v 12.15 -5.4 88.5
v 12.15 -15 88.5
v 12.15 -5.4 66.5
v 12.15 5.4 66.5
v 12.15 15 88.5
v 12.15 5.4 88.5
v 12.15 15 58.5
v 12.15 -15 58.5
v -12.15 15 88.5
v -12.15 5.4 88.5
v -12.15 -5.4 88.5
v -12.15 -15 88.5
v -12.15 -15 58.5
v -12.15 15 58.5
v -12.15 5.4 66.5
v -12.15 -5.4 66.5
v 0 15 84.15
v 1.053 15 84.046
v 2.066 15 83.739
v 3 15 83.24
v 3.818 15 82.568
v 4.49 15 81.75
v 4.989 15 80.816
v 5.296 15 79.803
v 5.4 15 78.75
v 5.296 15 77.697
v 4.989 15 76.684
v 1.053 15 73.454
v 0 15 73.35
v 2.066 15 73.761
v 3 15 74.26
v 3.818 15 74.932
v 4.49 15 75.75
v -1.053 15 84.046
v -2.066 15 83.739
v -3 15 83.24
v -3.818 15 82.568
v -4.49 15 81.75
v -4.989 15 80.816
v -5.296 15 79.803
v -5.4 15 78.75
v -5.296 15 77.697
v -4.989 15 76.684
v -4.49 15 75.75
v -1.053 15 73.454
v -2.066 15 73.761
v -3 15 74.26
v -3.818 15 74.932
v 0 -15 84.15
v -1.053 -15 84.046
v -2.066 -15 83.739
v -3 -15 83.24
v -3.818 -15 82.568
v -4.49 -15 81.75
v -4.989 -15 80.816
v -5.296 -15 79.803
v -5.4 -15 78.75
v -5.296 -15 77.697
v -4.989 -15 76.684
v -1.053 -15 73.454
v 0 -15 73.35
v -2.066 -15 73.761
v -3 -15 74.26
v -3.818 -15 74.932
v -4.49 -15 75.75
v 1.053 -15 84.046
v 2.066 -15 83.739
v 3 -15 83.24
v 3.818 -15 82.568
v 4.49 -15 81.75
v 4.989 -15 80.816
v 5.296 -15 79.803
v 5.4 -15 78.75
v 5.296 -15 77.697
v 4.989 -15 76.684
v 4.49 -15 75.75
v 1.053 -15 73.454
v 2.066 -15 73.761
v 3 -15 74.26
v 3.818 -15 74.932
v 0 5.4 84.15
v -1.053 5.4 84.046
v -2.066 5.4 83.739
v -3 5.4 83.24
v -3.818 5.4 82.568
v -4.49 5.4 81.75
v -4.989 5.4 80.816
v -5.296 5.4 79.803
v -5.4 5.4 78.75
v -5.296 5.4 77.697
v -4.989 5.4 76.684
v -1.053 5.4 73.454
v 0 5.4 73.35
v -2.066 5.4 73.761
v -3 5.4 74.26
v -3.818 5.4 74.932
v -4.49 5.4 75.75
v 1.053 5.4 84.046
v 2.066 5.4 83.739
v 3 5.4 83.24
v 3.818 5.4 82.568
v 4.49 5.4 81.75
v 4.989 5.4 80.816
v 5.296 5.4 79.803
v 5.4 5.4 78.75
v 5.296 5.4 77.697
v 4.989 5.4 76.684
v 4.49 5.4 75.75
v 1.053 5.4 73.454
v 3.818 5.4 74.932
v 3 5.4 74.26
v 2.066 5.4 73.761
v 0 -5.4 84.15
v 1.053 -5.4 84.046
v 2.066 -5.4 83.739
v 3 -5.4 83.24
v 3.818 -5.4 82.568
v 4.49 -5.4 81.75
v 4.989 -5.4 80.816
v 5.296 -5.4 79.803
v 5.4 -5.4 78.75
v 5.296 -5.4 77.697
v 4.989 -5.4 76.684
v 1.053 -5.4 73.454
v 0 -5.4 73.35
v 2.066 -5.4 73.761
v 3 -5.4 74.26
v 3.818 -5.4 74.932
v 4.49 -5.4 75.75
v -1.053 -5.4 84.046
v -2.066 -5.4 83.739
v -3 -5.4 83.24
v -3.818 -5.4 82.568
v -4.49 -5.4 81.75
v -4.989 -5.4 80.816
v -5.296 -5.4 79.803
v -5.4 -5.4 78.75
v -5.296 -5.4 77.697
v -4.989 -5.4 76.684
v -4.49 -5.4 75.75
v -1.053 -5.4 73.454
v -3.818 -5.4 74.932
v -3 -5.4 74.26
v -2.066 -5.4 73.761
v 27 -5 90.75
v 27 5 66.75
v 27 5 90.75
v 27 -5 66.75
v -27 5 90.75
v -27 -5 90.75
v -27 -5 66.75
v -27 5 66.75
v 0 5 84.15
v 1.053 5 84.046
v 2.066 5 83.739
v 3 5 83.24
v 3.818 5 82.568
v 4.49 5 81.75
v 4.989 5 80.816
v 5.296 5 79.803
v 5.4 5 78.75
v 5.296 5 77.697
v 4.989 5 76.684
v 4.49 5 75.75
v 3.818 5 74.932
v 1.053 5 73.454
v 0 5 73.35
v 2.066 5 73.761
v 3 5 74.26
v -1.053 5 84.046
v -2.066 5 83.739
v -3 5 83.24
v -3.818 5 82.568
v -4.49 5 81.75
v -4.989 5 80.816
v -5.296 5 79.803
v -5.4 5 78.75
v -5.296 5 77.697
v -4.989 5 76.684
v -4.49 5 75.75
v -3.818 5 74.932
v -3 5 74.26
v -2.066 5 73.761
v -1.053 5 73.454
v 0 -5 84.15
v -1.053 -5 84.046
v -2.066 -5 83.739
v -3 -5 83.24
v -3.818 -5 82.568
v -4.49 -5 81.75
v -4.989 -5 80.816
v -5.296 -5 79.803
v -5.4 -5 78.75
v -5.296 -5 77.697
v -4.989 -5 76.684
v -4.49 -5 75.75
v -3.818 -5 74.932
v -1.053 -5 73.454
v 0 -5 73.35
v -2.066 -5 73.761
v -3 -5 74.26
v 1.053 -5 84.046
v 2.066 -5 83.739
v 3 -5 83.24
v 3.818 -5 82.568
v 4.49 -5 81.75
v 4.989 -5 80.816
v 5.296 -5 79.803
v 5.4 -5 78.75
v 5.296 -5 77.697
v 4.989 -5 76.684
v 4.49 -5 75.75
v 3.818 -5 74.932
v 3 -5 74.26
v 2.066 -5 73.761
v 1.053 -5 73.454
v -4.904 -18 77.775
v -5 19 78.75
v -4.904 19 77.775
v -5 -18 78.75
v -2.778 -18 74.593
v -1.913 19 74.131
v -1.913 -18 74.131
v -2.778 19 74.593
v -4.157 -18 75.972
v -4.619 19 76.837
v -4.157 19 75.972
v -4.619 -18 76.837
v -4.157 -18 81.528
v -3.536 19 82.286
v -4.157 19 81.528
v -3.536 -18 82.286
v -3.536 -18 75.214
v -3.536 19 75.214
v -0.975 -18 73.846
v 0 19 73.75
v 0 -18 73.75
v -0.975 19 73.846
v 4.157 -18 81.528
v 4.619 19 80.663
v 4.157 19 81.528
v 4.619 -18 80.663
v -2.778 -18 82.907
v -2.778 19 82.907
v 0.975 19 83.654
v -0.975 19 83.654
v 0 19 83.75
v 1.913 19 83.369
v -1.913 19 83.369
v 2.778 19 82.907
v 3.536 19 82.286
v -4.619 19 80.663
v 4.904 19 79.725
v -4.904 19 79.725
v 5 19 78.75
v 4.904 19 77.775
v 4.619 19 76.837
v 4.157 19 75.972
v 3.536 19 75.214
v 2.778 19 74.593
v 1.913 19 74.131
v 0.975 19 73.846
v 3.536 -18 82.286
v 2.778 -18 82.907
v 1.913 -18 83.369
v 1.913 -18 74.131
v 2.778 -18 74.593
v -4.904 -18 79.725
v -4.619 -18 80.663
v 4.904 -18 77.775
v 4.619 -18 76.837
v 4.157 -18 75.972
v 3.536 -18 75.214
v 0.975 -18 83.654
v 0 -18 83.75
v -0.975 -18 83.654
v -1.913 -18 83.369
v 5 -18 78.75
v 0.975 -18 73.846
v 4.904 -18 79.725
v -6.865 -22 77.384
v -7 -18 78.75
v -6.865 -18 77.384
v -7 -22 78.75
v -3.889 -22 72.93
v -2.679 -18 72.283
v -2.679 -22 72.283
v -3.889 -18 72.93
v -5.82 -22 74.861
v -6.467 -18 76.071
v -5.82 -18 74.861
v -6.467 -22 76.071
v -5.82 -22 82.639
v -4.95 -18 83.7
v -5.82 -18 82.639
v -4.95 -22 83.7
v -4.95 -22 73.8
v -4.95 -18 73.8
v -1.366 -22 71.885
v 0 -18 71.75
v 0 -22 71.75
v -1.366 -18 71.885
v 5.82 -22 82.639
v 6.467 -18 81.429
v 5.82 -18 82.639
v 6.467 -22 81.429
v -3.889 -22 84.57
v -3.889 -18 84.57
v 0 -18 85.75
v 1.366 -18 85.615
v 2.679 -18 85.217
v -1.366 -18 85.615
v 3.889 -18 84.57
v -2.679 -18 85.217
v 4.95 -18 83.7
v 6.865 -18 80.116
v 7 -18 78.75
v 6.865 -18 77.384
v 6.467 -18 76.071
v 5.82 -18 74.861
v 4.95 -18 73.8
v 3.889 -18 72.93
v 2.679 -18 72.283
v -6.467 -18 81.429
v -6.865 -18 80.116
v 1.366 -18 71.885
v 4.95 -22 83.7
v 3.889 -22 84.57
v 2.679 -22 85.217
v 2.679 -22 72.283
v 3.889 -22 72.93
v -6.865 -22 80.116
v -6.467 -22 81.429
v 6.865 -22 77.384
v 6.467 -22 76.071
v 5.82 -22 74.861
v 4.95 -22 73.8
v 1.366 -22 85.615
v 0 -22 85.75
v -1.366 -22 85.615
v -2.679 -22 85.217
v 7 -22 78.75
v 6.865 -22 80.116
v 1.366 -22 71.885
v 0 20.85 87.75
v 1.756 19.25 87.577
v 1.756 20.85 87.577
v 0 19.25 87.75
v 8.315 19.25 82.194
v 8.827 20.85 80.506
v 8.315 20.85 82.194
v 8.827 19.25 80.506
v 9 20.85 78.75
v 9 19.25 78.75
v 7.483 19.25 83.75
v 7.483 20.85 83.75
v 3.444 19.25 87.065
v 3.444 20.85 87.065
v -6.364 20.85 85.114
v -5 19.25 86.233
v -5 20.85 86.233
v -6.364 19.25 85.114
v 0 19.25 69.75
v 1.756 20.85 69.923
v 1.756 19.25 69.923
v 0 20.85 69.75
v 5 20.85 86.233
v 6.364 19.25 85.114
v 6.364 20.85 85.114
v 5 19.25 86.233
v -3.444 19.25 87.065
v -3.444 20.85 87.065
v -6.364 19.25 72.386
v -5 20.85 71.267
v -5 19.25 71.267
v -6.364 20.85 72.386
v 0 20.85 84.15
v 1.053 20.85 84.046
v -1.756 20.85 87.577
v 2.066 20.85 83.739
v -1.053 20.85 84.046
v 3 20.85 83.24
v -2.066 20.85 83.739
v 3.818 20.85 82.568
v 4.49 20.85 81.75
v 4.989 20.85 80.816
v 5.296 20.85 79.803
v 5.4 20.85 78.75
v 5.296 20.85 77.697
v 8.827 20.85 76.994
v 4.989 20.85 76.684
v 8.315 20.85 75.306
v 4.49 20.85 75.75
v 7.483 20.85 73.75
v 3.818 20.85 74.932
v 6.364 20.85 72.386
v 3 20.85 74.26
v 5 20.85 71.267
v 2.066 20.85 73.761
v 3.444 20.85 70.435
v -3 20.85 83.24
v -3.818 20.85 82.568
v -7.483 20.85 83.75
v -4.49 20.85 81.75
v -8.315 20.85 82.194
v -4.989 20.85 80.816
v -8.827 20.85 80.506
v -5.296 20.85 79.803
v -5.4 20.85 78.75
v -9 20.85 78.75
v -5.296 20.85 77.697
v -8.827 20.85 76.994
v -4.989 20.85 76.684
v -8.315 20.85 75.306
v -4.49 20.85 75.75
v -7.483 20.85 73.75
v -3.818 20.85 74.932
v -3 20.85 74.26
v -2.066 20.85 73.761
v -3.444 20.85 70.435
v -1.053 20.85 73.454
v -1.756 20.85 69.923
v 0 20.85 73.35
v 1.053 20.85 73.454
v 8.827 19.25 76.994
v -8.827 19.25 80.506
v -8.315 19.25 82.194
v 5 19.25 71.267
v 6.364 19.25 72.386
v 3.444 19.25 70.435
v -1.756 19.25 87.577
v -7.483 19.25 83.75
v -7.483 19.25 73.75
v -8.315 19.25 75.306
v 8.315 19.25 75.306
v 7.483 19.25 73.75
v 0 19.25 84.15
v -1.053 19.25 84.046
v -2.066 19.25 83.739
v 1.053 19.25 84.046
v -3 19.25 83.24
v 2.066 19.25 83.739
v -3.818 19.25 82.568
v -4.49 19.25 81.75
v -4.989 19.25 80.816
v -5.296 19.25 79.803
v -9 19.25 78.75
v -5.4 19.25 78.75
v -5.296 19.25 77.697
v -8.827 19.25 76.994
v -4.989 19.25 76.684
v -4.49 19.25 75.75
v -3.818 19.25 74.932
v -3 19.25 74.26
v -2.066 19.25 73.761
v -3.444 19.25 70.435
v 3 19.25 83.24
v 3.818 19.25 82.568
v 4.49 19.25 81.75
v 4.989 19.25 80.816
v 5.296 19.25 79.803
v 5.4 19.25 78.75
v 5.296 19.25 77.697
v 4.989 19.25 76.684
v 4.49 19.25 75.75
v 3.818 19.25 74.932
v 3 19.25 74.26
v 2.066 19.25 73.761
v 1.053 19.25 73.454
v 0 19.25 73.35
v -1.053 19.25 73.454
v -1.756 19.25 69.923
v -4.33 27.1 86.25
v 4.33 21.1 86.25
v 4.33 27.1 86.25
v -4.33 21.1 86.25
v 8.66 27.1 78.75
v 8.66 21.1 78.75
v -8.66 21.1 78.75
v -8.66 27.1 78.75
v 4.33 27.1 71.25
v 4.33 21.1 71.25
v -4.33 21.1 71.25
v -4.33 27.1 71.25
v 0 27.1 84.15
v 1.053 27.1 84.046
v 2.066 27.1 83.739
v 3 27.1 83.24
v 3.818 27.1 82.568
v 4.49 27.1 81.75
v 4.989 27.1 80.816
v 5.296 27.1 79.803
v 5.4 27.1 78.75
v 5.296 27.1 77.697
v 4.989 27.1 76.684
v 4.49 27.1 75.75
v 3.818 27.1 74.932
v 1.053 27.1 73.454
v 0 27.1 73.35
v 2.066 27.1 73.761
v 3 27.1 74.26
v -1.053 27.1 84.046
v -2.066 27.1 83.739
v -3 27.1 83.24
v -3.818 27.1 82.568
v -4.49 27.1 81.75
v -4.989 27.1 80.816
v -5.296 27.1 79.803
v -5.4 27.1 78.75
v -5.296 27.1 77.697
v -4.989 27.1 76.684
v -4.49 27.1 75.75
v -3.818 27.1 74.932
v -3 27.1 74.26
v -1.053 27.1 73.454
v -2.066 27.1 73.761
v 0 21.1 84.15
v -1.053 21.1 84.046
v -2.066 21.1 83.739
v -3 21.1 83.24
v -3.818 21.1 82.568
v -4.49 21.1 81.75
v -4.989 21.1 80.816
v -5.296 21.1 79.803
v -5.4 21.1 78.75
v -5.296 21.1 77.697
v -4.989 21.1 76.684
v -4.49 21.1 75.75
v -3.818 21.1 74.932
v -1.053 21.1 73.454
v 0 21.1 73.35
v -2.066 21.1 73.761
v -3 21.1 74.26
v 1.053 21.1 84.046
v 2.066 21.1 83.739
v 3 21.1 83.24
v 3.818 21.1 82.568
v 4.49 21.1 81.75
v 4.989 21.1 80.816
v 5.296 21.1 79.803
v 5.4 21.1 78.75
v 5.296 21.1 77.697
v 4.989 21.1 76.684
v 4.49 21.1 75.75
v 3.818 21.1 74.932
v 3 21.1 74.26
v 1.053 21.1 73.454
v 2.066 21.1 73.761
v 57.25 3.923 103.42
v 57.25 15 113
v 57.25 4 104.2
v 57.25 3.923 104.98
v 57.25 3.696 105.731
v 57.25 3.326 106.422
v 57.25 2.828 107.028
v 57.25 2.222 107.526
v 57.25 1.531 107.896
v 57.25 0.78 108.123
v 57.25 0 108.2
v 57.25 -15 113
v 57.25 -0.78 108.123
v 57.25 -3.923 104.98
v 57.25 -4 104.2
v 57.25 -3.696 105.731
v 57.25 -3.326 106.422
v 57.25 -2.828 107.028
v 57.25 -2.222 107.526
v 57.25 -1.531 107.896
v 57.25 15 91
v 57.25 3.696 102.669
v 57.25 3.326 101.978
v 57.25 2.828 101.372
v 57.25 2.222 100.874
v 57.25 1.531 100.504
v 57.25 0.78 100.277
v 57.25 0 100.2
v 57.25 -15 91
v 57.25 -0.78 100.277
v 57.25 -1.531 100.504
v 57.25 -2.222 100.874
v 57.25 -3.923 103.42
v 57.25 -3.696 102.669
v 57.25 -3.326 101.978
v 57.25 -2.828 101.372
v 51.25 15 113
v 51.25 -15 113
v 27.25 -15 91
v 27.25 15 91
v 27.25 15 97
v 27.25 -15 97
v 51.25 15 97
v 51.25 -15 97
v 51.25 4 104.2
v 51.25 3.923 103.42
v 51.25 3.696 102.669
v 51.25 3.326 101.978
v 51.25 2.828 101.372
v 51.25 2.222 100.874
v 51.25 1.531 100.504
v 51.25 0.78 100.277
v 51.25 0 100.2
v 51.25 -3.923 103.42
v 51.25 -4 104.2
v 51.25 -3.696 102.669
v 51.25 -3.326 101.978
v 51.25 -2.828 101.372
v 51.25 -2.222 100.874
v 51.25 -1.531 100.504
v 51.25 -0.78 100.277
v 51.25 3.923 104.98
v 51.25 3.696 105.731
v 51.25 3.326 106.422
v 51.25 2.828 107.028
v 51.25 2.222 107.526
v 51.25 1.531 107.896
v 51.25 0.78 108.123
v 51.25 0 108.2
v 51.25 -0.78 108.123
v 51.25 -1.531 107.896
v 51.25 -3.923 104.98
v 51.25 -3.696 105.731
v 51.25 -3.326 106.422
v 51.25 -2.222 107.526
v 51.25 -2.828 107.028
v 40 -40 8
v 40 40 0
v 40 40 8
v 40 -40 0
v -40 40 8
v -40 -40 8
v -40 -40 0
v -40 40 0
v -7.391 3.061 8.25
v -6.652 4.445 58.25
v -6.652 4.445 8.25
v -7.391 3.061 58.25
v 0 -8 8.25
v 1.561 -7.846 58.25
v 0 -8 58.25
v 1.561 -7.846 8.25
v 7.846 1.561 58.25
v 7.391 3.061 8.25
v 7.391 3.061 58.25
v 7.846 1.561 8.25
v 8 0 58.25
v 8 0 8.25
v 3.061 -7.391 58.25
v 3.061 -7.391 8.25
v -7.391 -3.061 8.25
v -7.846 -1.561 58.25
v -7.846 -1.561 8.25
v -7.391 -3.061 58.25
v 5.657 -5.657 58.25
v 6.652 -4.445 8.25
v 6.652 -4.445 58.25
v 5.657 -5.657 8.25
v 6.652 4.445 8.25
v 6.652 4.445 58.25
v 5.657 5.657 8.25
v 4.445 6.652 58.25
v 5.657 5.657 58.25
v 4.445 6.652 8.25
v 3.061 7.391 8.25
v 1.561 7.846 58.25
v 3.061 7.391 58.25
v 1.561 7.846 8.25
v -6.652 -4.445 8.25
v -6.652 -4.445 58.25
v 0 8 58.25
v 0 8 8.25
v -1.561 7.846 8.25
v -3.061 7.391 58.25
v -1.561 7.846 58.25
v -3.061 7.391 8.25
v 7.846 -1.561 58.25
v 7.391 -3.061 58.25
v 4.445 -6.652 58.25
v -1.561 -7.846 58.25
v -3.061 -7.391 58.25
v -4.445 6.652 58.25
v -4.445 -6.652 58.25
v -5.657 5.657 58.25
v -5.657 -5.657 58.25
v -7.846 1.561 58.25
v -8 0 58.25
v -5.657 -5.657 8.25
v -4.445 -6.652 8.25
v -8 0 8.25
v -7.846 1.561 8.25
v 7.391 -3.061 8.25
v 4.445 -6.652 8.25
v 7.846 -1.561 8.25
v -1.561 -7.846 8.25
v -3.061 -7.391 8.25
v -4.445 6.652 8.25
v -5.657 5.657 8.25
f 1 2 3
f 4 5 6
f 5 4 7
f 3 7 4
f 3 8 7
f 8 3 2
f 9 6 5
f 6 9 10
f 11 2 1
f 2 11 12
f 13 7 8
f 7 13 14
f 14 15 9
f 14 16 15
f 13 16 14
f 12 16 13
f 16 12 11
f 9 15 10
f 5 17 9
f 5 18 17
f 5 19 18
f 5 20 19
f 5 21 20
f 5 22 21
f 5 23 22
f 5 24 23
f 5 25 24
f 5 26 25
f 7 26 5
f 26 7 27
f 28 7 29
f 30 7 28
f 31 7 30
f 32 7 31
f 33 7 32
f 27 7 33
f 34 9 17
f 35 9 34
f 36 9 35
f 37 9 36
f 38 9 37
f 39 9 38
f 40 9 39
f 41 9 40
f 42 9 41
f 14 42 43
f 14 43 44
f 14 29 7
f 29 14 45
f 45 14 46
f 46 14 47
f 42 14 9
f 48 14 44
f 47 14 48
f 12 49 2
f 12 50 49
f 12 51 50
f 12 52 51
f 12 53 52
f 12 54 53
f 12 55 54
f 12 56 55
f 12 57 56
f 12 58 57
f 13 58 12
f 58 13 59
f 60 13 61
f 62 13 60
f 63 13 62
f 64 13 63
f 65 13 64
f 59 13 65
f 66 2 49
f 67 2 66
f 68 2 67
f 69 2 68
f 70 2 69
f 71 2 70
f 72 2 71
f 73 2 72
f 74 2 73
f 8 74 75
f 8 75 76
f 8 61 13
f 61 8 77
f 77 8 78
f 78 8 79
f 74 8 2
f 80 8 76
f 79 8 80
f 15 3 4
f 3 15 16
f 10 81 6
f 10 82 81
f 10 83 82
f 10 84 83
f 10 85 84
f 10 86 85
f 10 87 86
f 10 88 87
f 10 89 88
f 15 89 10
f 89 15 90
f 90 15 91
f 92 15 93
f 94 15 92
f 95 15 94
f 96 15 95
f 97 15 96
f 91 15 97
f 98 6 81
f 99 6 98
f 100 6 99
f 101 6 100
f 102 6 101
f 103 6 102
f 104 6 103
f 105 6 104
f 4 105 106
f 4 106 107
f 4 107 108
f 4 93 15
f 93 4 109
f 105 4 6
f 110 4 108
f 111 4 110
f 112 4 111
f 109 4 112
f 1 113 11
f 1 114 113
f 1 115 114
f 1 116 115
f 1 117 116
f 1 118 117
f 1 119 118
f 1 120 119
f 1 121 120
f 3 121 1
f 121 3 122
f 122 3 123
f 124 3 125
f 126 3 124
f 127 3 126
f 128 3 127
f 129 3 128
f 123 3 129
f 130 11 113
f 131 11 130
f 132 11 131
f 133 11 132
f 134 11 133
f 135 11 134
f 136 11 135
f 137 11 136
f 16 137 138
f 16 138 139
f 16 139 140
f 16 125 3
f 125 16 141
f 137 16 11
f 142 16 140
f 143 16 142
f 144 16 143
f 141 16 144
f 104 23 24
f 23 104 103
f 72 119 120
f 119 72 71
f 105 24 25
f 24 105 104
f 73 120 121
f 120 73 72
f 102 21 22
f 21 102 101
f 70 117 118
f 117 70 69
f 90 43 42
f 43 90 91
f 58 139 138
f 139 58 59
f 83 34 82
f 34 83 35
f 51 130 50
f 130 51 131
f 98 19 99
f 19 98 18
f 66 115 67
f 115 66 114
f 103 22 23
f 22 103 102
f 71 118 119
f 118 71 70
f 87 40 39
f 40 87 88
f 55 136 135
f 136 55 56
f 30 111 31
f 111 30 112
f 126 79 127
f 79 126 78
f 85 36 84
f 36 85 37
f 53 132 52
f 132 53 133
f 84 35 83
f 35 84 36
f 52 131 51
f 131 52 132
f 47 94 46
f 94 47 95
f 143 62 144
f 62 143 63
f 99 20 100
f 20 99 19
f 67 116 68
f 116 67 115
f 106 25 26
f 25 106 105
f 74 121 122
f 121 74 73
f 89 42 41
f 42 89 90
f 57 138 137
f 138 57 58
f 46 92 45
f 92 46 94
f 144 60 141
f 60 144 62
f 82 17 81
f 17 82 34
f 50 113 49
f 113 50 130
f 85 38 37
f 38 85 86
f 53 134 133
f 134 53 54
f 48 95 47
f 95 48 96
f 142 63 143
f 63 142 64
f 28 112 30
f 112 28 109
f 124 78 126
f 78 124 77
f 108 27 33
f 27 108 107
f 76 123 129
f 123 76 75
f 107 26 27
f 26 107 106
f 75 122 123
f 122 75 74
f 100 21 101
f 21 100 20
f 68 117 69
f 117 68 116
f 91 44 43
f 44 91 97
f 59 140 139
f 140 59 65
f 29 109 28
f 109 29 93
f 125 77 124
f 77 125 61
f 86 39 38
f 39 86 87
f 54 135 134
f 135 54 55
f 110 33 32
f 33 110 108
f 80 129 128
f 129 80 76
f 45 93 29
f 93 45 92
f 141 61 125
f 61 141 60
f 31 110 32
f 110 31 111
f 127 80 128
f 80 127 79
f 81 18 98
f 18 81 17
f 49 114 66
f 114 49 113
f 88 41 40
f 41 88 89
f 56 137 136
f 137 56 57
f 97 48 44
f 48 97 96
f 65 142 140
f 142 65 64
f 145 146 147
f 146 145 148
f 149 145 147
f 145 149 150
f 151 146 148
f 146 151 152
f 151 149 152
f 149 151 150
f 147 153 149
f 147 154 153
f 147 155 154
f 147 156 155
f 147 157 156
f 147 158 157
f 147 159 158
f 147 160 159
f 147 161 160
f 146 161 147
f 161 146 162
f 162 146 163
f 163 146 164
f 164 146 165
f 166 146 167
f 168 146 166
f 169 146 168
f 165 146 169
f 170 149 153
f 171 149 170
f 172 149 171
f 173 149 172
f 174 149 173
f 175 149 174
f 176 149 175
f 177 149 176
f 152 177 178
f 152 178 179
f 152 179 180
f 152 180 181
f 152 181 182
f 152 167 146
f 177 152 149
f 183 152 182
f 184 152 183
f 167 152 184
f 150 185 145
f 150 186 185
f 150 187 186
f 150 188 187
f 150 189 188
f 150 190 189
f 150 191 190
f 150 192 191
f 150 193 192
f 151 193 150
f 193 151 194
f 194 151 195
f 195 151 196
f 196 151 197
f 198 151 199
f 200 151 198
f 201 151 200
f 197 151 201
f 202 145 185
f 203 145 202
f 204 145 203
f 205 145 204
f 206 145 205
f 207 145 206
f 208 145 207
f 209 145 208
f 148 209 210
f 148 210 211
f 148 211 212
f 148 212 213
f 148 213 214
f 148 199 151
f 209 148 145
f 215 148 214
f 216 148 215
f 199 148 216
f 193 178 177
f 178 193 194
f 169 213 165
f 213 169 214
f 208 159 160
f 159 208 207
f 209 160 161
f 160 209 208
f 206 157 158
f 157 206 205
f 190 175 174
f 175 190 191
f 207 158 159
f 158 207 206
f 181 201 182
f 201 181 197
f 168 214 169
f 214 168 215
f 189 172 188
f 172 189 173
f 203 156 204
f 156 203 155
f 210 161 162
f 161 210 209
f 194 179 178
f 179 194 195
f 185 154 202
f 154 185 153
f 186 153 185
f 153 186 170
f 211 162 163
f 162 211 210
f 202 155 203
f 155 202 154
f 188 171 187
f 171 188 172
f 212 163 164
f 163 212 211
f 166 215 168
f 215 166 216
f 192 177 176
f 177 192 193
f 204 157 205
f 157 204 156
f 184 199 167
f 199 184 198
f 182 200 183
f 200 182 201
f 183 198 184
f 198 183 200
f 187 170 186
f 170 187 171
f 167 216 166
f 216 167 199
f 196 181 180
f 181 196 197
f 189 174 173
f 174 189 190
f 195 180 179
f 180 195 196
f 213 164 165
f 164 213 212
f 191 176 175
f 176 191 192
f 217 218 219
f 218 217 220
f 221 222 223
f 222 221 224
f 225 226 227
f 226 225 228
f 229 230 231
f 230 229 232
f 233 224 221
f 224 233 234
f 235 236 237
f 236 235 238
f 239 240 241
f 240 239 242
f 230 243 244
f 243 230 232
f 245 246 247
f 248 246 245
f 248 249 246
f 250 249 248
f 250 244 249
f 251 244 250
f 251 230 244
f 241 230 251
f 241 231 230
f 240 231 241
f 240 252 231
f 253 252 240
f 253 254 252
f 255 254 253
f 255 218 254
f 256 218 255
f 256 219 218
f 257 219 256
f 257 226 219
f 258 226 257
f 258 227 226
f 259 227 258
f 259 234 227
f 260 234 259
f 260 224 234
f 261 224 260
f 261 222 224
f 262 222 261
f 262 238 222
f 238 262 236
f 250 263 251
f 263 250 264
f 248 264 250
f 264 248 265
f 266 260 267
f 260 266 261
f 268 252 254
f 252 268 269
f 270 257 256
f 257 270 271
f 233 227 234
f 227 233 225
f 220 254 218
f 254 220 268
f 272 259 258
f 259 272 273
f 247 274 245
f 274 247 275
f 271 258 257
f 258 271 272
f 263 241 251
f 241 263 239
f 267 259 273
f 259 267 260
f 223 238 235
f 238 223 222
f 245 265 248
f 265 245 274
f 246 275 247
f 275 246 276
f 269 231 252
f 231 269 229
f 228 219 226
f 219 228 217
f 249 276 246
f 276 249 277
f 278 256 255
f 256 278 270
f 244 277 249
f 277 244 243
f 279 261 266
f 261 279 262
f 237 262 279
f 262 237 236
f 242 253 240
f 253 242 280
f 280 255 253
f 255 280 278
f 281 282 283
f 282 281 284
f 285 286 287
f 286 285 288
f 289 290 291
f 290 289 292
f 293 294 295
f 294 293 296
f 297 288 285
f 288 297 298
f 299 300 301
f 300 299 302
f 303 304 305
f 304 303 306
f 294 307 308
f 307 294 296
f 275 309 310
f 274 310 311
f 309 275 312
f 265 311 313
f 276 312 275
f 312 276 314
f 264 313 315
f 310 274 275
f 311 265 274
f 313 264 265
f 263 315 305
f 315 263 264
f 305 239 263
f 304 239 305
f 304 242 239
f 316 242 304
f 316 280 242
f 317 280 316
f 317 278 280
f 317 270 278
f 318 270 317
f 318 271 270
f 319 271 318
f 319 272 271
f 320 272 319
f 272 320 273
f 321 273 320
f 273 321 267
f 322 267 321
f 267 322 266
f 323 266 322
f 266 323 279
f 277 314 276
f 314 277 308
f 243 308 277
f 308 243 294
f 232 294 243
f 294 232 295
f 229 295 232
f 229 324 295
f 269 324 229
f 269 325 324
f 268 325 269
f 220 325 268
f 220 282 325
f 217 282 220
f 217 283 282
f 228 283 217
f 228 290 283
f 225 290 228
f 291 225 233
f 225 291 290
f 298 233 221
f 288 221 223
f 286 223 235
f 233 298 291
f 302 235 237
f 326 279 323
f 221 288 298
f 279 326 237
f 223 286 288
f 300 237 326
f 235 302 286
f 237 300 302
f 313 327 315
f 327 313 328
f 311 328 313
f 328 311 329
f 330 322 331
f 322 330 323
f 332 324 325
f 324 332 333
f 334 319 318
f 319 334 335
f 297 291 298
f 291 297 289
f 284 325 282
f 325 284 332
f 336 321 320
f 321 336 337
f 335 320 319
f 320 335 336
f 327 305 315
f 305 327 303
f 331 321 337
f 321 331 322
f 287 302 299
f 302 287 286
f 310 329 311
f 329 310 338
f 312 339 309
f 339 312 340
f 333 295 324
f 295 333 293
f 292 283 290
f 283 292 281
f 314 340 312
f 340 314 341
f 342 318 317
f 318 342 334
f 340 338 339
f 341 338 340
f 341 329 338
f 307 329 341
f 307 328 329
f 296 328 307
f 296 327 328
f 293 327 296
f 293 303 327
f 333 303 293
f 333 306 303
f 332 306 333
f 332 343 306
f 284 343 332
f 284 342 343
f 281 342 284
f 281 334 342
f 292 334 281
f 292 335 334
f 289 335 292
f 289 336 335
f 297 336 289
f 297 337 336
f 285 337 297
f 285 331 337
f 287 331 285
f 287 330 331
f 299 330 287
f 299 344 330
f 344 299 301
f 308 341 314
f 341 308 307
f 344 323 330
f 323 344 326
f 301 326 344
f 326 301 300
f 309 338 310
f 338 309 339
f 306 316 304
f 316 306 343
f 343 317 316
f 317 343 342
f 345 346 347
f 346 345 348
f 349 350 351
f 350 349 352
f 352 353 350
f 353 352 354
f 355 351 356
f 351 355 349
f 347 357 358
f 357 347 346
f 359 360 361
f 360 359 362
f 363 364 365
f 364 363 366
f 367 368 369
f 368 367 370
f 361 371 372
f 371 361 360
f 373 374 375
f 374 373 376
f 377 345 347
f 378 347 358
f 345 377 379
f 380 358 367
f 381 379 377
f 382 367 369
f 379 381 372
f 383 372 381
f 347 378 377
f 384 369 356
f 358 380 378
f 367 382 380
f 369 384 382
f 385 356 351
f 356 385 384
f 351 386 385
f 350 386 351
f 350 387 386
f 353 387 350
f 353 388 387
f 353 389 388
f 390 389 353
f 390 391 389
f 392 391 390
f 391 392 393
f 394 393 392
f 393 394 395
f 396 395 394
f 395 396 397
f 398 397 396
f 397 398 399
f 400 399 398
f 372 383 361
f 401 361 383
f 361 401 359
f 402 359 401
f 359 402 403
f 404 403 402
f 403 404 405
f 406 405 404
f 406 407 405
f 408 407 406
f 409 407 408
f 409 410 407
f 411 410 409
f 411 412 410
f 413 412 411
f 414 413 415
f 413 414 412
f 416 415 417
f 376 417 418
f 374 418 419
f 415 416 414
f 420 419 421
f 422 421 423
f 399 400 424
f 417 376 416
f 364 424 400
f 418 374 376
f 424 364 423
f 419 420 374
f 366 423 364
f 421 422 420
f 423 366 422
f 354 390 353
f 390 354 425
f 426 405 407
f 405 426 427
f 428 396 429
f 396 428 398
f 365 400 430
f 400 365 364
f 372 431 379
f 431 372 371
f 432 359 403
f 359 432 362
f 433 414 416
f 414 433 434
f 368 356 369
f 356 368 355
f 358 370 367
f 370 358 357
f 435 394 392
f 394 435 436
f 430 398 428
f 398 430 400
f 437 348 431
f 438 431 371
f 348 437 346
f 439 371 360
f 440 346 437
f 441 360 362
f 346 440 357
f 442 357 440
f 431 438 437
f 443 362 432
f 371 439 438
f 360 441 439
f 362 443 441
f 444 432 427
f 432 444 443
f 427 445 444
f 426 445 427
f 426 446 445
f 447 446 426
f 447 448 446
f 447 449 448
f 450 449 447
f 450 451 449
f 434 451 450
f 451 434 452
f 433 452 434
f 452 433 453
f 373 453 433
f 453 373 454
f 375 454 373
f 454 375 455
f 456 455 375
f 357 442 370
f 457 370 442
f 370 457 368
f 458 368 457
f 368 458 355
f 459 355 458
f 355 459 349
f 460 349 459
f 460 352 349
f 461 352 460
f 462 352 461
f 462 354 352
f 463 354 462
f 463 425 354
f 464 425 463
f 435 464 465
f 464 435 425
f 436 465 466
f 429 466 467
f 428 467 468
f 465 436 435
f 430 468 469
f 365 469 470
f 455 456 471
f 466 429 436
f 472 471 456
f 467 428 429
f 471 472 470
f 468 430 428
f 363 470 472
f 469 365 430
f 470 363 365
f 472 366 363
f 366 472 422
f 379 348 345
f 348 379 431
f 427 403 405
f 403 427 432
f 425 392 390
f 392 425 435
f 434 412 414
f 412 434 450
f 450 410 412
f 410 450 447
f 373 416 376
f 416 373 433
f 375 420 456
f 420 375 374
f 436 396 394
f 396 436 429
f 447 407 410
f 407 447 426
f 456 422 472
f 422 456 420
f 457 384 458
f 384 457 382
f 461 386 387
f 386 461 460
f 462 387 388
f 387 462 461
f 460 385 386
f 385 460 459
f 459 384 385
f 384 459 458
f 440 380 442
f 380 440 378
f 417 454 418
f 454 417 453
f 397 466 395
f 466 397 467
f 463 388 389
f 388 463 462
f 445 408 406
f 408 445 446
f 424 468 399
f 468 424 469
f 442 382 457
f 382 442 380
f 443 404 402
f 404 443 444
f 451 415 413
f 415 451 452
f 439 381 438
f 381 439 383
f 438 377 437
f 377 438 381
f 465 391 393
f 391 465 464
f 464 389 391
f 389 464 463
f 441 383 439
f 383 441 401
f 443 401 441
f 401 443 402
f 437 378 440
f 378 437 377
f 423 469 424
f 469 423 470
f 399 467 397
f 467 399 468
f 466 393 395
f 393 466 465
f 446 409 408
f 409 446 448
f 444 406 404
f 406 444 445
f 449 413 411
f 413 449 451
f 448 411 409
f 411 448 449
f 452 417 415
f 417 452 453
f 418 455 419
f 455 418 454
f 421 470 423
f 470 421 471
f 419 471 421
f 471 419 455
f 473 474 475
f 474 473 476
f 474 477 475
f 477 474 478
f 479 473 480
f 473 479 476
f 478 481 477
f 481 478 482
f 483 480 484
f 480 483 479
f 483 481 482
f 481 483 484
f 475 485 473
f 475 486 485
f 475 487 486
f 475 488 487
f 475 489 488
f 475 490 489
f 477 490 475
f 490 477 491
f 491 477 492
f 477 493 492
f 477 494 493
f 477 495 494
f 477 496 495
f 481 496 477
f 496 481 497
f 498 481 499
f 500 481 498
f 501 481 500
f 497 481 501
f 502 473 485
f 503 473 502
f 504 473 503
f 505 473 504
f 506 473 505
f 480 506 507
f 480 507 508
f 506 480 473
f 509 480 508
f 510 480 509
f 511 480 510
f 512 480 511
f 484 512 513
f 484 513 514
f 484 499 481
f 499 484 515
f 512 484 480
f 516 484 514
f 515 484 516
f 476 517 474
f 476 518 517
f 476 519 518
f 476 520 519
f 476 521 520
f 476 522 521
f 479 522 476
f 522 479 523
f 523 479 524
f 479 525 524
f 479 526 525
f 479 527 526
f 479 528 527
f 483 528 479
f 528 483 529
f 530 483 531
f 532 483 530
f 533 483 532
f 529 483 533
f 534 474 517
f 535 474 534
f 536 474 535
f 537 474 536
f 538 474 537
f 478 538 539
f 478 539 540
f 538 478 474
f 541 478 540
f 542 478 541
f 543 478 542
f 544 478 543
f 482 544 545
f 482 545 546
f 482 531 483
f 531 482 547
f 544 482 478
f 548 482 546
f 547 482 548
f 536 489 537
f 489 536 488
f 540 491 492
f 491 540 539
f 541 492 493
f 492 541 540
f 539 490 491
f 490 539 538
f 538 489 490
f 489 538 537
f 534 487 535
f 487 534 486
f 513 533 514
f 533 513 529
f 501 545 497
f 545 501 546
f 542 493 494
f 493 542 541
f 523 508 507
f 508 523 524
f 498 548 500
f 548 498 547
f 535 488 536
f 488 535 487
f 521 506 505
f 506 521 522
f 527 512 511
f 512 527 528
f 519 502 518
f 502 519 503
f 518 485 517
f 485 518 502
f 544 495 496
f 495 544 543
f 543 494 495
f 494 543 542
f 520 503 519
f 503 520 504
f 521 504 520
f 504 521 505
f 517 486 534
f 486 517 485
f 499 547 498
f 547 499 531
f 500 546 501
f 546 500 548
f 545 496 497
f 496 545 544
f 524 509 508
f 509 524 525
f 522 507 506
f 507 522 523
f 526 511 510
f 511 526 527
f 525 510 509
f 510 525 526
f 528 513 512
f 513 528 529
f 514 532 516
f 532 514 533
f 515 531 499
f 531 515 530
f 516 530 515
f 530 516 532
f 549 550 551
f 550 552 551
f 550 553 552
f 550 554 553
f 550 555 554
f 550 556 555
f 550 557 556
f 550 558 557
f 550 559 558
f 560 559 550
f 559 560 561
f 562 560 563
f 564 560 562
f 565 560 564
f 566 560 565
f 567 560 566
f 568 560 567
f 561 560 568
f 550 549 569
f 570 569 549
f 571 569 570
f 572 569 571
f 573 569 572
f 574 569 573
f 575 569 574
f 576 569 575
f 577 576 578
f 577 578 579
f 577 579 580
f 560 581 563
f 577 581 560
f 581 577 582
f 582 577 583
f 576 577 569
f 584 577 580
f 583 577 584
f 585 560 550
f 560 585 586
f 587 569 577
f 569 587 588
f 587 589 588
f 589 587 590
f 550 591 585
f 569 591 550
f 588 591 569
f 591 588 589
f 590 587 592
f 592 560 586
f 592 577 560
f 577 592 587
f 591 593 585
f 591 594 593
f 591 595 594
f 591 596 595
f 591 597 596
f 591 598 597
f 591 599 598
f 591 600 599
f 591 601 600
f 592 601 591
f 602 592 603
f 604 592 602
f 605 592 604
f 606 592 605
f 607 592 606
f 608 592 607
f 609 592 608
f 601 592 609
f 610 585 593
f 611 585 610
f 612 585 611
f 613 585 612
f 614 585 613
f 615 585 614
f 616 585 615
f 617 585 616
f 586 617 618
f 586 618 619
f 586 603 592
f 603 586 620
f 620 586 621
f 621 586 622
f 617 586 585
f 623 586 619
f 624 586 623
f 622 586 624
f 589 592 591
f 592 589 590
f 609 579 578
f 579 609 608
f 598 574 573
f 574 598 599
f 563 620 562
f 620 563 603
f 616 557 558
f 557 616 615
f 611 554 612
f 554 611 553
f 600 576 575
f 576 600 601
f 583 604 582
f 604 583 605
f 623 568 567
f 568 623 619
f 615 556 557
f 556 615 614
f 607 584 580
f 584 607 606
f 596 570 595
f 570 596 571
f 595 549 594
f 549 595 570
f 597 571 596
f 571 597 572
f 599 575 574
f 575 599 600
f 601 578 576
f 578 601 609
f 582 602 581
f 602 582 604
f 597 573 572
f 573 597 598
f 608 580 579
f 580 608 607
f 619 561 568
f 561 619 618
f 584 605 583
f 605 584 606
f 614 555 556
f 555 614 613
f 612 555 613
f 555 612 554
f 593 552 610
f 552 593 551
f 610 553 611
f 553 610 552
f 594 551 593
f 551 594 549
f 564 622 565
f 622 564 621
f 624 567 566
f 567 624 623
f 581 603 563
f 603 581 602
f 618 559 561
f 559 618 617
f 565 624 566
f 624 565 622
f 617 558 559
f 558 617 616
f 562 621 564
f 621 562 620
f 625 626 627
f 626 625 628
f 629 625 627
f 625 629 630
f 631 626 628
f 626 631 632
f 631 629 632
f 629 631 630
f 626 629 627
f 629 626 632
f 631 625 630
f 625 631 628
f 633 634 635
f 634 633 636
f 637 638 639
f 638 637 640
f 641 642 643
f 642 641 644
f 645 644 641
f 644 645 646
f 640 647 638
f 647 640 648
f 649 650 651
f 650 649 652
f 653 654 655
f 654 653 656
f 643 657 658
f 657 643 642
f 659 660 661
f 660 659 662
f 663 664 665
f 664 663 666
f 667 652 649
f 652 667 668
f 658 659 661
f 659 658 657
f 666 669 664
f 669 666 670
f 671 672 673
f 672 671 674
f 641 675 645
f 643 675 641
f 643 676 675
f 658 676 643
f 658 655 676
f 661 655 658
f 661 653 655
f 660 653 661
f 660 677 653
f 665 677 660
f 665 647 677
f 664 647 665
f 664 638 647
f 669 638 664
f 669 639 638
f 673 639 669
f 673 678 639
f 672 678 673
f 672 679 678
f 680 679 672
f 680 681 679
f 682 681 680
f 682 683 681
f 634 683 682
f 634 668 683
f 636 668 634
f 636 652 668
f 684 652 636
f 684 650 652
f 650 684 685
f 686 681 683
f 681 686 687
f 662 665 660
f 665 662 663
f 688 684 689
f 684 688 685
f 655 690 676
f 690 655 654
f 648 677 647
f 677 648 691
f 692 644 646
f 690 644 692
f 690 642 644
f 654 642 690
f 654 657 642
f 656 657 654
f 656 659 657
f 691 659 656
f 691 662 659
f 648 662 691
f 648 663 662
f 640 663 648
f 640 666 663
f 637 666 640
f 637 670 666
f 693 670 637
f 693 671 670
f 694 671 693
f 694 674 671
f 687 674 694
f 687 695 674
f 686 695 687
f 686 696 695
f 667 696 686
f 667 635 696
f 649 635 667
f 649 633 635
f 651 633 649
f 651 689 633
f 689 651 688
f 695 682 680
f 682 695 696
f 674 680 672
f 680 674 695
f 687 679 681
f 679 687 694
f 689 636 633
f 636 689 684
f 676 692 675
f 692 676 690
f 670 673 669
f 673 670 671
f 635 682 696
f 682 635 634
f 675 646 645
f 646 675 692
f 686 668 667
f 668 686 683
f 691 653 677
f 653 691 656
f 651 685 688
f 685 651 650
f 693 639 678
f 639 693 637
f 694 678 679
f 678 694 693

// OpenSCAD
$fn = 32;

// ------------------------------------------------------------------------
// Lamp arm: column d16 x 50 mm, arm 54 mm
// Every part is its own module, assembly() places every instance.
// ------------------------------------------------------------------------

// --- part 1 ---
module lamp_base() {
  difference() {
    translate([-40, -40, 0]) cube([80, 80, 8]);
  }
}

// --- part 2 ---
module lamp_column() {
  cylinder(h = 50, d = 16);
}

// --- part 3 ---
module head_fork() {
  difference() {
    translate([-12.15, -15, 0]) cube([24.3, 30, 30]);
    translate([-13.15, -5.4, 8]) cube([26.3, 10.8, 23]);
    translate([0, 0, 20.25]) rotate([90, 0, 0]) cylinder(h = 32, d = 10.8, center = true);
  }
}

// --- part 4 ---
module lamp_arm() {
  difference() {
    translate([-27, -5, 0]) cube([54, 10, 24]);
    translate([0, 0, 12]) rotate([90, 0, 0]) cylinder(h = 12, d = 10.8, center = true);
  }
}

// --- part 5 ---
module arm_pin() {
  rotate([0, 90, 0]) cylinder(h = 38, d = 10, center = true);
  translate([-22, 0, 0]) rotate([0, 90, 0]) cylinder(h = 4, d = 14);
}

// --- part 6 ---
module arm_washer() {
  difference() {
      translate([0, 0, 0]) cylinder(h = 1.6, d = 18);
      translate([0, 0, -1]) cylinder(h = 3.6, d = 10.8);
    }
}

// --- part 7 ---
module arm_nut() {
  difference() {
    linear_extrude(height = 6) polygon(points = [[8.66, 0], [4.33, 7.5], [-4.33, 7.5], [-8.66, 0], [-4.33, -7.5], [4.33, -7.5]]);
    translate([0, 0, -1]) cylinder(h = 8, d = 10.8);
  }
}

// --- part 8 ---
module shade_bracket() {
  difference() {
    translate([-15, -15, 0]) cube([30, 30, 22]);
    translate([-16, -16, 6]) cube([25, 32, 17]);
    translate([12, 0, 13.2]) rotate([0, 90, 0]) cylinder(h = 8, d = 8, center = true);
  }
}

// --- assembly ---
module assembly() {
  color([0.80, 0.24, 0.20]) translate([0, 0, 0]) rotate([0, 0, 0]) lamp_base();
  color([0.20, 0.45, 0.75]) translate([0, 0, 8.25]) rotate([0, 0, 0]) lamp_column();
  color([0.25, 0.62, 0.32]) translate([0, 0, 58.5]) rotate([0, 0, 0]) head_fork();
  color([0.92, 0.70, 0.18]) translate([0, 0, 66.75]) rotate([0, 0, 0]) lamp_arm();
  color([0.58, 0.35, 0.70]) translate([0, 0, 78.75]) rotate([0, 0, 90]) arm_pin();
  color([0.16, 0.66, 0.66]) translate([0, 20.85, 78.75]) rotate([90, 0, 0]) arm_washer();
  color([0.85, 0.48, 0.18]) translate([0, 27.1, 78.75]) rotate([90, 0, 0]) arm_nut();
  color([0.55, 0.60, 0.65]) translate([42.25, 0, 91]) rotate([0, 0, 0]) shade_bracket();
}

assembly();
